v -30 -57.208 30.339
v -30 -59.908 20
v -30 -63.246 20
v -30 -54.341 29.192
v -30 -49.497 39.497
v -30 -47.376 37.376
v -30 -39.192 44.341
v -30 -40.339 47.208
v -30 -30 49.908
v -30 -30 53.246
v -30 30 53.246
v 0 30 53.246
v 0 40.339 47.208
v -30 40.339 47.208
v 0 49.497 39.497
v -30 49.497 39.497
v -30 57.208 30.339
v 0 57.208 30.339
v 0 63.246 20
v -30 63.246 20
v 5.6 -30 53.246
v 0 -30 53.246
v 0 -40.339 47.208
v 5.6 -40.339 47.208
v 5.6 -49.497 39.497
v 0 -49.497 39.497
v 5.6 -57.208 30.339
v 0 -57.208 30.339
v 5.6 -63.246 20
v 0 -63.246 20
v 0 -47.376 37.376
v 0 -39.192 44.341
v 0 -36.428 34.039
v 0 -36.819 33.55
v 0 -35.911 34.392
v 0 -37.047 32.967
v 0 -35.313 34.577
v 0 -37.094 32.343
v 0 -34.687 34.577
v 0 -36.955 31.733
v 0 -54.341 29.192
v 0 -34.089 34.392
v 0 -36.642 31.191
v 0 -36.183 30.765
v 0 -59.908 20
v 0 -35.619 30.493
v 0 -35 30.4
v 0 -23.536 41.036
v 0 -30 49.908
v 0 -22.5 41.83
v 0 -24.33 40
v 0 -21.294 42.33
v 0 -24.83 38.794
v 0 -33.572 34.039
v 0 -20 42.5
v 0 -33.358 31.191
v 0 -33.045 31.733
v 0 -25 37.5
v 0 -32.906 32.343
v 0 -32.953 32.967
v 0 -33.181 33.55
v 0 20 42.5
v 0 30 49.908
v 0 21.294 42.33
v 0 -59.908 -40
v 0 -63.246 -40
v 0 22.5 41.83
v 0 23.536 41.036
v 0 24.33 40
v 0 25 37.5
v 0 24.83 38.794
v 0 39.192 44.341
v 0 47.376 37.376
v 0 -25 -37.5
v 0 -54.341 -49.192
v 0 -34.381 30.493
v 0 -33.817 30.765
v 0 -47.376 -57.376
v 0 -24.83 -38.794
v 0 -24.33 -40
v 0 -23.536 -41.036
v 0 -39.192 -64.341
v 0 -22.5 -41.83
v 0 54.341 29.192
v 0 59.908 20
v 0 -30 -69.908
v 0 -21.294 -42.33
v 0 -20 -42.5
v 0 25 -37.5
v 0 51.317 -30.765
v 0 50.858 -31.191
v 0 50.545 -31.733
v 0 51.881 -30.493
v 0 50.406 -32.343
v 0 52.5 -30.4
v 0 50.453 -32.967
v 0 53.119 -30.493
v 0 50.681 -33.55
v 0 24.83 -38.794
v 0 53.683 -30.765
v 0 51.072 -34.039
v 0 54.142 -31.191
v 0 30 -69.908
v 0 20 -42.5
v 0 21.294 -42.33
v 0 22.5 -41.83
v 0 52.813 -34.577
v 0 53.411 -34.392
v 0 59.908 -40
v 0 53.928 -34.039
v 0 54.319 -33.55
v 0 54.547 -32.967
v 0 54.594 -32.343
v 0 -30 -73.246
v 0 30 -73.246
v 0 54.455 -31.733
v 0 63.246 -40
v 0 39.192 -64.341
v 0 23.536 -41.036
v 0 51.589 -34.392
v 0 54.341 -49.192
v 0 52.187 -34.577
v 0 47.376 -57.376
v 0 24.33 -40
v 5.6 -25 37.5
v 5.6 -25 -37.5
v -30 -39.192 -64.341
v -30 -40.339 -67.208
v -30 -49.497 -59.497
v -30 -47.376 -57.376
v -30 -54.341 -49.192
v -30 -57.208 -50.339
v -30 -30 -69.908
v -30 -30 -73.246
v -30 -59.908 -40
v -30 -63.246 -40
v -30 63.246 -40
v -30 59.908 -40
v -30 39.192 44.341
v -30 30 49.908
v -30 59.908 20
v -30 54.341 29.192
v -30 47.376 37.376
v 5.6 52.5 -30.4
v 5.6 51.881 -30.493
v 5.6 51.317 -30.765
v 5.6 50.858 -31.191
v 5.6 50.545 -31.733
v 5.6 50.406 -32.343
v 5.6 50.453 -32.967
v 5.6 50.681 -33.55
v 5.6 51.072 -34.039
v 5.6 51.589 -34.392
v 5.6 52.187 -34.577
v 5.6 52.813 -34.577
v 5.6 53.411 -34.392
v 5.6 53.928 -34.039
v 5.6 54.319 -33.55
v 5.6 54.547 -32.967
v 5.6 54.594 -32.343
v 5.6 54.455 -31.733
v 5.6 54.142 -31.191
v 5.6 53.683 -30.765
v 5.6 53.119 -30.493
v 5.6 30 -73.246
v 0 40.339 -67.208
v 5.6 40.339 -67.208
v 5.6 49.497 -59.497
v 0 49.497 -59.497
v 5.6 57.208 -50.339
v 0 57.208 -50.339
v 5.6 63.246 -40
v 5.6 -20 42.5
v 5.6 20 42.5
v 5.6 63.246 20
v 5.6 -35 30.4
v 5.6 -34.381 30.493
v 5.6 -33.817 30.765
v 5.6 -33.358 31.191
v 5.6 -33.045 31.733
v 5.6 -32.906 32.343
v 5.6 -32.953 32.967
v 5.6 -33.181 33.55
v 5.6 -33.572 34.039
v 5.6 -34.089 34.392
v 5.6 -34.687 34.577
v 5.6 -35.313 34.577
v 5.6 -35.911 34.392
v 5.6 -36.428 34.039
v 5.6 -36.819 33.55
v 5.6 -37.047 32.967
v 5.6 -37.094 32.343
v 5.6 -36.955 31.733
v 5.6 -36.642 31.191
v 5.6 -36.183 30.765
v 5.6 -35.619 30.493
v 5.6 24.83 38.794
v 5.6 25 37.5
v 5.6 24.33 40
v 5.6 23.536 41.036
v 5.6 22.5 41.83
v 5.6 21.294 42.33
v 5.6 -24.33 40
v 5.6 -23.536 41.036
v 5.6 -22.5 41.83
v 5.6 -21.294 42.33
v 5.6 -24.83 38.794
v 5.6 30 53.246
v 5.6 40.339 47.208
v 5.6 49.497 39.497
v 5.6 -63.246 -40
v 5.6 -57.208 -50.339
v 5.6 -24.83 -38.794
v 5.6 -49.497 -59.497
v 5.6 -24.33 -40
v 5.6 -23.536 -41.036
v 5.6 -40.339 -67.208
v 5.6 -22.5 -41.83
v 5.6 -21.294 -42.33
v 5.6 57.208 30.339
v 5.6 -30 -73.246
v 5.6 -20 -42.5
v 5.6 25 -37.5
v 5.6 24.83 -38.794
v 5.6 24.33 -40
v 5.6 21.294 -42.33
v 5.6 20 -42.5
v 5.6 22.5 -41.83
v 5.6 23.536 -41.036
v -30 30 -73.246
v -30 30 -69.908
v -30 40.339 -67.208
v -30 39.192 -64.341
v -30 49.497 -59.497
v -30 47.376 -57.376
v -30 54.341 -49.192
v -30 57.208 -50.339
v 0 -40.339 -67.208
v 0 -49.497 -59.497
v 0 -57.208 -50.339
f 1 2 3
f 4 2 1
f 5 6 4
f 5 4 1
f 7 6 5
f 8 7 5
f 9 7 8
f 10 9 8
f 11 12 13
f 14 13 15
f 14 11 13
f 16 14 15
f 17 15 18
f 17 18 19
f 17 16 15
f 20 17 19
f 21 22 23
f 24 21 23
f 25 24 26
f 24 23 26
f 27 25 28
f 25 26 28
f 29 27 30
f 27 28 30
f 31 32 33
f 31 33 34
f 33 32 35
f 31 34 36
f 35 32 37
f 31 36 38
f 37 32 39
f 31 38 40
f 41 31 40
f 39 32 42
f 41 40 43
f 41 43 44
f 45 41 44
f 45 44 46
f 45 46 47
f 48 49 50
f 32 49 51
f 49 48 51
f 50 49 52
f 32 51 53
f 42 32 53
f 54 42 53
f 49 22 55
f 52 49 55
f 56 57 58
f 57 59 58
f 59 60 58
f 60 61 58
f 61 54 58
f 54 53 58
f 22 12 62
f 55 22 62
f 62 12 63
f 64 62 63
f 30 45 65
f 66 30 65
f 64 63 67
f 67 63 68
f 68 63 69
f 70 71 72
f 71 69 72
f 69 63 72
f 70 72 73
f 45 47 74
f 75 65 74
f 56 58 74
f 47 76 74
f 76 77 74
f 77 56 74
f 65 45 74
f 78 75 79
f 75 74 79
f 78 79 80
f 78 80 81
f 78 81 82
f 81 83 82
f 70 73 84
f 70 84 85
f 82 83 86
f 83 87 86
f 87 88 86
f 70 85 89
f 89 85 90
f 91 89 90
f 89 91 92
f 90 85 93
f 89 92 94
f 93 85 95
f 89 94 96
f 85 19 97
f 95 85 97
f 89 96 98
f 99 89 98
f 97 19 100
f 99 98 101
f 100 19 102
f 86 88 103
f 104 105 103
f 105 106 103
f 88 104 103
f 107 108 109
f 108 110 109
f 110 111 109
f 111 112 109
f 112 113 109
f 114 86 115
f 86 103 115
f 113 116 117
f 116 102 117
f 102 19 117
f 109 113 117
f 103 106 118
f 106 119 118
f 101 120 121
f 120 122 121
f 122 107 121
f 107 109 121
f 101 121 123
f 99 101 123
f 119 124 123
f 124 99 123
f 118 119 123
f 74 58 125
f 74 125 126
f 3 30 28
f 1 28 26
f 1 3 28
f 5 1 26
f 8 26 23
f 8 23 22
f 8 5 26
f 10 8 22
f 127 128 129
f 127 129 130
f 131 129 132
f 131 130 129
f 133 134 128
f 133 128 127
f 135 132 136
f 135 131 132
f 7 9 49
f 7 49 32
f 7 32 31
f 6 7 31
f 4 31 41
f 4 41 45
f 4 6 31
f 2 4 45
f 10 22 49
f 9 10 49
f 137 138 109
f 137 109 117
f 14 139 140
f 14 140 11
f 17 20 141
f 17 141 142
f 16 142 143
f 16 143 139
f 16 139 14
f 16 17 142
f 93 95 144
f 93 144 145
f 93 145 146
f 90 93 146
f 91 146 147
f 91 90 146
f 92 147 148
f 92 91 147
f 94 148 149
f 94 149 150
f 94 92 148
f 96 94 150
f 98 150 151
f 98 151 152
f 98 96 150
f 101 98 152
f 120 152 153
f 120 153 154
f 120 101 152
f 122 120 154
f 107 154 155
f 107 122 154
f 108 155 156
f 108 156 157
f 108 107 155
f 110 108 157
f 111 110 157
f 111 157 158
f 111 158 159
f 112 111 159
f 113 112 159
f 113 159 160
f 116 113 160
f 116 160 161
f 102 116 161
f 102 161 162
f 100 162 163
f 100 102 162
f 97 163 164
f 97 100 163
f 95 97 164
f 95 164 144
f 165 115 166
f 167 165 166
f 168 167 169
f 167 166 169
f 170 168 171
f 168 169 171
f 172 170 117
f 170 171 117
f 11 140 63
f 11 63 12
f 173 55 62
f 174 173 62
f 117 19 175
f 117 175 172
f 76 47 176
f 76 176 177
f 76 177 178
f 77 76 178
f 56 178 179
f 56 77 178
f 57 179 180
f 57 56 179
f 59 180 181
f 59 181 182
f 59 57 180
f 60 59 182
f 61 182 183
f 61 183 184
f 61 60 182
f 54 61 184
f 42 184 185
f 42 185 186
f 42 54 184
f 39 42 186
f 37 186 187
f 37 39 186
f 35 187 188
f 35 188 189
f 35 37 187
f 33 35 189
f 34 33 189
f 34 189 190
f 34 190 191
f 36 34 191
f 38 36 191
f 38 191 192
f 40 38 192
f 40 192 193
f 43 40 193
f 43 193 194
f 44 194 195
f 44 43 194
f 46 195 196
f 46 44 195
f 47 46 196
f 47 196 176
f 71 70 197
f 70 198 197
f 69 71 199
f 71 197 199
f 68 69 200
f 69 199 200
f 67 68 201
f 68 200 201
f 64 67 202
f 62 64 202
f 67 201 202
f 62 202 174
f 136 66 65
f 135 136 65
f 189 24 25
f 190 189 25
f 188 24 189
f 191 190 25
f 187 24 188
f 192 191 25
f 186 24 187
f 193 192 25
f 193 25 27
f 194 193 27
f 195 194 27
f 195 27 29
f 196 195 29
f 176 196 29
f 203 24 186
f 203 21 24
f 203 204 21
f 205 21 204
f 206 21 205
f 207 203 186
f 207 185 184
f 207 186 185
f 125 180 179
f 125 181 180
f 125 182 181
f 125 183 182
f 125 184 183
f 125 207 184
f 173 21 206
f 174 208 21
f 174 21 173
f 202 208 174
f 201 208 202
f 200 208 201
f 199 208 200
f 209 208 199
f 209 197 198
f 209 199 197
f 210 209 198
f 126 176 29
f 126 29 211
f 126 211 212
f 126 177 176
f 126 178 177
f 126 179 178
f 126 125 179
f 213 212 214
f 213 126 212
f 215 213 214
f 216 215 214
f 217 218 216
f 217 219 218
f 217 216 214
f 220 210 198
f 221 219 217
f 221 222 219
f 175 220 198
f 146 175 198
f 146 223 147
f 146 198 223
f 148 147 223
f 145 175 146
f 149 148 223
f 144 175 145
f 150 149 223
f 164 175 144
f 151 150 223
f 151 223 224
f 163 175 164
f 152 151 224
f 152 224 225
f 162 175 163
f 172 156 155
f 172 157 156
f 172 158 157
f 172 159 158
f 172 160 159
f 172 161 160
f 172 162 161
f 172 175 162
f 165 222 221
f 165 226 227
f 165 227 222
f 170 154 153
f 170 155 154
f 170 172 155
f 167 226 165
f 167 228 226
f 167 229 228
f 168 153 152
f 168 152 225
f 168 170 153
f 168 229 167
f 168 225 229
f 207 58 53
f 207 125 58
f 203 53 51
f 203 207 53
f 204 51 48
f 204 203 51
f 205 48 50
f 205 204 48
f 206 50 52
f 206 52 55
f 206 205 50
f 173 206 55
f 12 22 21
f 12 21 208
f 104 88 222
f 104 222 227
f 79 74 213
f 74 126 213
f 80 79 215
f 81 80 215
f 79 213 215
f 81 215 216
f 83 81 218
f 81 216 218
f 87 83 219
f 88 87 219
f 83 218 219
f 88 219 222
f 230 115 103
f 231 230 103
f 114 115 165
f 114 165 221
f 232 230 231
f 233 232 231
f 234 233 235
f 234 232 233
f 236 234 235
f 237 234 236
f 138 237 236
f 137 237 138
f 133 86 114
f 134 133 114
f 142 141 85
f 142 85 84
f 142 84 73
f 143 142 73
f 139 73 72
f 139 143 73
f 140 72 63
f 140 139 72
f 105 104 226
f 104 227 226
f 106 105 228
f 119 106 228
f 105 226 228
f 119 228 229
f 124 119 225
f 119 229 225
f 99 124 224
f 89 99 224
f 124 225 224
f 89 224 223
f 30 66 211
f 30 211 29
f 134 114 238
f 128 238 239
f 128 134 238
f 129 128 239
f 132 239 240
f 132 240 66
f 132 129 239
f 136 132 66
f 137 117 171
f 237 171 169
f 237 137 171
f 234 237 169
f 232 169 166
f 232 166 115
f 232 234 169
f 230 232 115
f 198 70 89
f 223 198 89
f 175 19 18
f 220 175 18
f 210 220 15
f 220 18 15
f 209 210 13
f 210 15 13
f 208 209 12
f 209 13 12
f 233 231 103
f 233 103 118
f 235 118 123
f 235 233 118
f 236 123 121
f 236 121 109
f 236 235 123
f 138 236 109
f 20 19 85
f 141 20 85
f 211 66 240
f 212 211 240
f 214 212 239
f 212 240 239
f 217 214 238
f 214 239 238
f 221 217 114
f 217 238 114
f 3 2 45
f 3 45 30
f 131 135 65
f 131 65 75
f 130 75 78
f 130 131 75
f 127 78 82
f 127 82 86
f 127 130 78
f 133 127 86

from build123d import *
from build123d.topology import SkipClean

# Parameters (mm, degrees)
SKETCH_1_R          = 70
SKETCH_1_R_2        = 2.1
SKETCH_1_W          = 85
SKETCH_1_H          = 50
EXTRUDE_2_DEPTH     = 5.6
FILLET_1_R          = 5
EXTRUDE_START       = 30
EXTRUDE_3_DEPTH     = 30
CUT_EXTRUDE_1_DEPTH = 111.453610172


with BuildPart() as part:
    # ｽｹｯﾁ1 → ﾎﾞｽ - 押し出し2 (new body)
    with BuildSketch(Plane(origin=(0, 0, 0), x_dir=(0, 0, -1), z_dir=(1, 0, 0))):
        with Locations((10, 0)):
            Circle(SKETCH_1_R)
        with Locations(Location((32.5, 52.5, 0), (0, 0, 180))):
            Circle(SKETCH_1_R_2, mode=Mode.SUBTRACT)
        with Locations((-32.5, -35)):
            Circle(SKETCH_1_R_2, mode=Mode.SUBTRACT)
        Rectangle(SKETCH_1_W, SKETCH_1_H, mode=Mode.SUBTRACT)
    extrude(amount=EXTRUDE_2_DEPTH)

    # ﾌｨﾚｯﾄ1
    fillet_1_edges = [part.edges().sort_by_distance(p)[0] for p in [
        (2.8, -25, -42.5),
        (2.8, 25, -42.5),
        (2.8, 25, 42.5),
        (2.8, -25, 42.5),
    ]]
    fillet(fillet_1_edges, radius=FILLET_1_R)

    # ｽｹｯﾁ2 → ﾎﾞｽ - 押し出し3 (add)
    with SkipClean():  # the faces are left unmerged after this step: merging them gives an invalid solid
        with BuildSketch(Plane.ZY.offset(EXTRUDE_START)):
            with BuildLine():
                ThreePointArc((-40, 63.245553203), (-59.497474683, 49.497474683), (-73.245553203, 30))
                Line((-73.245553203, 30), (-69.908263203, 30))
                ThreePointArc((-69.908263203, 30), (-57.376154339, 47.376154339), (-40, 59.908263203))
                Line((-40, 59.908263203), (-40, 63.245553203))
            make_face()
            with BuildLine():
                ThreePointArc((53.245553203, 30), (39.497474683, 49.497474683), (20, 63.245553203))
                Line((20, 63.245553203), (20, 59.908263203))
                ThreePointArc((20, 59.908263203), (37.376154339, 47.37615434), (49.908263203, 30))
                Line((49.908263203, 30), (53.245553203, 30))
            make_face()
            with BuildLine():
                Line((-69.908263203, -30), (-73.245553203, -30))
                ThreePointArc((-73.245553203, -30), (-59.497474683, -49.497474683), (-40, -63.245553203))
                Line((-40, -63.245553203), (-40, -59.908263203))
                ThreePointArc((-40, -59.908263203), (-57.376154339, -47.376154339), (-69.908263203, -30))
            make_face()
            with BuildLine():
                Line((20, -59.908263203), (20, -63.245553203))
                ThreePointArc((20, -63.245553203), (39.497474683, -49.497474683), (53.245553203, -30))
                Line((53.245553203, -30), (49.908263203, -30))
                ThreePointArc((49.908263203, -30), (37.376154339, -47.37615434), (20, -59.908263203))
            make_face()
        extrude(amount=-EXTRUDE_3_DEPTH)

    # ｽｹｯﾁ3 → ｶｯﾄ - 押し出し1 (cut, through all)
    with BuildSketch(Plane.ZY):
        with BuildLine():
            Line((20, 63.245553203), (-40, 63.245553203))
            ThreePointArc((-40, 63.245553203), (-10, 70), (20, 63.245553203))
        make_face()
        with BuildLine():
            Line((-73.245553203, 30), (-73.245553203, -30))
            ThreePointArc((-73.245553203, -30), (-80, 0), (-73.245553203, 30))
        make_face()
        with BuildLine():
            Line((-40, -63.245553203), (20, -63.245553203))
            ThreePointArc((20, -63.245553203), (-10, -70), (-40, -63.245553203))
        make_face()
        with BuildLine():
            Line((53.245553203, -30), (53.245553203, 30))
            ThreePointArc((53.245553203, 30), (60, 0), (53.245553203, -30))
        make_face()
    extrude(amount=-CUT_EXTRUDE_1_DEPTH, mode=Mode.SUBTRACT)


solid = part.part
